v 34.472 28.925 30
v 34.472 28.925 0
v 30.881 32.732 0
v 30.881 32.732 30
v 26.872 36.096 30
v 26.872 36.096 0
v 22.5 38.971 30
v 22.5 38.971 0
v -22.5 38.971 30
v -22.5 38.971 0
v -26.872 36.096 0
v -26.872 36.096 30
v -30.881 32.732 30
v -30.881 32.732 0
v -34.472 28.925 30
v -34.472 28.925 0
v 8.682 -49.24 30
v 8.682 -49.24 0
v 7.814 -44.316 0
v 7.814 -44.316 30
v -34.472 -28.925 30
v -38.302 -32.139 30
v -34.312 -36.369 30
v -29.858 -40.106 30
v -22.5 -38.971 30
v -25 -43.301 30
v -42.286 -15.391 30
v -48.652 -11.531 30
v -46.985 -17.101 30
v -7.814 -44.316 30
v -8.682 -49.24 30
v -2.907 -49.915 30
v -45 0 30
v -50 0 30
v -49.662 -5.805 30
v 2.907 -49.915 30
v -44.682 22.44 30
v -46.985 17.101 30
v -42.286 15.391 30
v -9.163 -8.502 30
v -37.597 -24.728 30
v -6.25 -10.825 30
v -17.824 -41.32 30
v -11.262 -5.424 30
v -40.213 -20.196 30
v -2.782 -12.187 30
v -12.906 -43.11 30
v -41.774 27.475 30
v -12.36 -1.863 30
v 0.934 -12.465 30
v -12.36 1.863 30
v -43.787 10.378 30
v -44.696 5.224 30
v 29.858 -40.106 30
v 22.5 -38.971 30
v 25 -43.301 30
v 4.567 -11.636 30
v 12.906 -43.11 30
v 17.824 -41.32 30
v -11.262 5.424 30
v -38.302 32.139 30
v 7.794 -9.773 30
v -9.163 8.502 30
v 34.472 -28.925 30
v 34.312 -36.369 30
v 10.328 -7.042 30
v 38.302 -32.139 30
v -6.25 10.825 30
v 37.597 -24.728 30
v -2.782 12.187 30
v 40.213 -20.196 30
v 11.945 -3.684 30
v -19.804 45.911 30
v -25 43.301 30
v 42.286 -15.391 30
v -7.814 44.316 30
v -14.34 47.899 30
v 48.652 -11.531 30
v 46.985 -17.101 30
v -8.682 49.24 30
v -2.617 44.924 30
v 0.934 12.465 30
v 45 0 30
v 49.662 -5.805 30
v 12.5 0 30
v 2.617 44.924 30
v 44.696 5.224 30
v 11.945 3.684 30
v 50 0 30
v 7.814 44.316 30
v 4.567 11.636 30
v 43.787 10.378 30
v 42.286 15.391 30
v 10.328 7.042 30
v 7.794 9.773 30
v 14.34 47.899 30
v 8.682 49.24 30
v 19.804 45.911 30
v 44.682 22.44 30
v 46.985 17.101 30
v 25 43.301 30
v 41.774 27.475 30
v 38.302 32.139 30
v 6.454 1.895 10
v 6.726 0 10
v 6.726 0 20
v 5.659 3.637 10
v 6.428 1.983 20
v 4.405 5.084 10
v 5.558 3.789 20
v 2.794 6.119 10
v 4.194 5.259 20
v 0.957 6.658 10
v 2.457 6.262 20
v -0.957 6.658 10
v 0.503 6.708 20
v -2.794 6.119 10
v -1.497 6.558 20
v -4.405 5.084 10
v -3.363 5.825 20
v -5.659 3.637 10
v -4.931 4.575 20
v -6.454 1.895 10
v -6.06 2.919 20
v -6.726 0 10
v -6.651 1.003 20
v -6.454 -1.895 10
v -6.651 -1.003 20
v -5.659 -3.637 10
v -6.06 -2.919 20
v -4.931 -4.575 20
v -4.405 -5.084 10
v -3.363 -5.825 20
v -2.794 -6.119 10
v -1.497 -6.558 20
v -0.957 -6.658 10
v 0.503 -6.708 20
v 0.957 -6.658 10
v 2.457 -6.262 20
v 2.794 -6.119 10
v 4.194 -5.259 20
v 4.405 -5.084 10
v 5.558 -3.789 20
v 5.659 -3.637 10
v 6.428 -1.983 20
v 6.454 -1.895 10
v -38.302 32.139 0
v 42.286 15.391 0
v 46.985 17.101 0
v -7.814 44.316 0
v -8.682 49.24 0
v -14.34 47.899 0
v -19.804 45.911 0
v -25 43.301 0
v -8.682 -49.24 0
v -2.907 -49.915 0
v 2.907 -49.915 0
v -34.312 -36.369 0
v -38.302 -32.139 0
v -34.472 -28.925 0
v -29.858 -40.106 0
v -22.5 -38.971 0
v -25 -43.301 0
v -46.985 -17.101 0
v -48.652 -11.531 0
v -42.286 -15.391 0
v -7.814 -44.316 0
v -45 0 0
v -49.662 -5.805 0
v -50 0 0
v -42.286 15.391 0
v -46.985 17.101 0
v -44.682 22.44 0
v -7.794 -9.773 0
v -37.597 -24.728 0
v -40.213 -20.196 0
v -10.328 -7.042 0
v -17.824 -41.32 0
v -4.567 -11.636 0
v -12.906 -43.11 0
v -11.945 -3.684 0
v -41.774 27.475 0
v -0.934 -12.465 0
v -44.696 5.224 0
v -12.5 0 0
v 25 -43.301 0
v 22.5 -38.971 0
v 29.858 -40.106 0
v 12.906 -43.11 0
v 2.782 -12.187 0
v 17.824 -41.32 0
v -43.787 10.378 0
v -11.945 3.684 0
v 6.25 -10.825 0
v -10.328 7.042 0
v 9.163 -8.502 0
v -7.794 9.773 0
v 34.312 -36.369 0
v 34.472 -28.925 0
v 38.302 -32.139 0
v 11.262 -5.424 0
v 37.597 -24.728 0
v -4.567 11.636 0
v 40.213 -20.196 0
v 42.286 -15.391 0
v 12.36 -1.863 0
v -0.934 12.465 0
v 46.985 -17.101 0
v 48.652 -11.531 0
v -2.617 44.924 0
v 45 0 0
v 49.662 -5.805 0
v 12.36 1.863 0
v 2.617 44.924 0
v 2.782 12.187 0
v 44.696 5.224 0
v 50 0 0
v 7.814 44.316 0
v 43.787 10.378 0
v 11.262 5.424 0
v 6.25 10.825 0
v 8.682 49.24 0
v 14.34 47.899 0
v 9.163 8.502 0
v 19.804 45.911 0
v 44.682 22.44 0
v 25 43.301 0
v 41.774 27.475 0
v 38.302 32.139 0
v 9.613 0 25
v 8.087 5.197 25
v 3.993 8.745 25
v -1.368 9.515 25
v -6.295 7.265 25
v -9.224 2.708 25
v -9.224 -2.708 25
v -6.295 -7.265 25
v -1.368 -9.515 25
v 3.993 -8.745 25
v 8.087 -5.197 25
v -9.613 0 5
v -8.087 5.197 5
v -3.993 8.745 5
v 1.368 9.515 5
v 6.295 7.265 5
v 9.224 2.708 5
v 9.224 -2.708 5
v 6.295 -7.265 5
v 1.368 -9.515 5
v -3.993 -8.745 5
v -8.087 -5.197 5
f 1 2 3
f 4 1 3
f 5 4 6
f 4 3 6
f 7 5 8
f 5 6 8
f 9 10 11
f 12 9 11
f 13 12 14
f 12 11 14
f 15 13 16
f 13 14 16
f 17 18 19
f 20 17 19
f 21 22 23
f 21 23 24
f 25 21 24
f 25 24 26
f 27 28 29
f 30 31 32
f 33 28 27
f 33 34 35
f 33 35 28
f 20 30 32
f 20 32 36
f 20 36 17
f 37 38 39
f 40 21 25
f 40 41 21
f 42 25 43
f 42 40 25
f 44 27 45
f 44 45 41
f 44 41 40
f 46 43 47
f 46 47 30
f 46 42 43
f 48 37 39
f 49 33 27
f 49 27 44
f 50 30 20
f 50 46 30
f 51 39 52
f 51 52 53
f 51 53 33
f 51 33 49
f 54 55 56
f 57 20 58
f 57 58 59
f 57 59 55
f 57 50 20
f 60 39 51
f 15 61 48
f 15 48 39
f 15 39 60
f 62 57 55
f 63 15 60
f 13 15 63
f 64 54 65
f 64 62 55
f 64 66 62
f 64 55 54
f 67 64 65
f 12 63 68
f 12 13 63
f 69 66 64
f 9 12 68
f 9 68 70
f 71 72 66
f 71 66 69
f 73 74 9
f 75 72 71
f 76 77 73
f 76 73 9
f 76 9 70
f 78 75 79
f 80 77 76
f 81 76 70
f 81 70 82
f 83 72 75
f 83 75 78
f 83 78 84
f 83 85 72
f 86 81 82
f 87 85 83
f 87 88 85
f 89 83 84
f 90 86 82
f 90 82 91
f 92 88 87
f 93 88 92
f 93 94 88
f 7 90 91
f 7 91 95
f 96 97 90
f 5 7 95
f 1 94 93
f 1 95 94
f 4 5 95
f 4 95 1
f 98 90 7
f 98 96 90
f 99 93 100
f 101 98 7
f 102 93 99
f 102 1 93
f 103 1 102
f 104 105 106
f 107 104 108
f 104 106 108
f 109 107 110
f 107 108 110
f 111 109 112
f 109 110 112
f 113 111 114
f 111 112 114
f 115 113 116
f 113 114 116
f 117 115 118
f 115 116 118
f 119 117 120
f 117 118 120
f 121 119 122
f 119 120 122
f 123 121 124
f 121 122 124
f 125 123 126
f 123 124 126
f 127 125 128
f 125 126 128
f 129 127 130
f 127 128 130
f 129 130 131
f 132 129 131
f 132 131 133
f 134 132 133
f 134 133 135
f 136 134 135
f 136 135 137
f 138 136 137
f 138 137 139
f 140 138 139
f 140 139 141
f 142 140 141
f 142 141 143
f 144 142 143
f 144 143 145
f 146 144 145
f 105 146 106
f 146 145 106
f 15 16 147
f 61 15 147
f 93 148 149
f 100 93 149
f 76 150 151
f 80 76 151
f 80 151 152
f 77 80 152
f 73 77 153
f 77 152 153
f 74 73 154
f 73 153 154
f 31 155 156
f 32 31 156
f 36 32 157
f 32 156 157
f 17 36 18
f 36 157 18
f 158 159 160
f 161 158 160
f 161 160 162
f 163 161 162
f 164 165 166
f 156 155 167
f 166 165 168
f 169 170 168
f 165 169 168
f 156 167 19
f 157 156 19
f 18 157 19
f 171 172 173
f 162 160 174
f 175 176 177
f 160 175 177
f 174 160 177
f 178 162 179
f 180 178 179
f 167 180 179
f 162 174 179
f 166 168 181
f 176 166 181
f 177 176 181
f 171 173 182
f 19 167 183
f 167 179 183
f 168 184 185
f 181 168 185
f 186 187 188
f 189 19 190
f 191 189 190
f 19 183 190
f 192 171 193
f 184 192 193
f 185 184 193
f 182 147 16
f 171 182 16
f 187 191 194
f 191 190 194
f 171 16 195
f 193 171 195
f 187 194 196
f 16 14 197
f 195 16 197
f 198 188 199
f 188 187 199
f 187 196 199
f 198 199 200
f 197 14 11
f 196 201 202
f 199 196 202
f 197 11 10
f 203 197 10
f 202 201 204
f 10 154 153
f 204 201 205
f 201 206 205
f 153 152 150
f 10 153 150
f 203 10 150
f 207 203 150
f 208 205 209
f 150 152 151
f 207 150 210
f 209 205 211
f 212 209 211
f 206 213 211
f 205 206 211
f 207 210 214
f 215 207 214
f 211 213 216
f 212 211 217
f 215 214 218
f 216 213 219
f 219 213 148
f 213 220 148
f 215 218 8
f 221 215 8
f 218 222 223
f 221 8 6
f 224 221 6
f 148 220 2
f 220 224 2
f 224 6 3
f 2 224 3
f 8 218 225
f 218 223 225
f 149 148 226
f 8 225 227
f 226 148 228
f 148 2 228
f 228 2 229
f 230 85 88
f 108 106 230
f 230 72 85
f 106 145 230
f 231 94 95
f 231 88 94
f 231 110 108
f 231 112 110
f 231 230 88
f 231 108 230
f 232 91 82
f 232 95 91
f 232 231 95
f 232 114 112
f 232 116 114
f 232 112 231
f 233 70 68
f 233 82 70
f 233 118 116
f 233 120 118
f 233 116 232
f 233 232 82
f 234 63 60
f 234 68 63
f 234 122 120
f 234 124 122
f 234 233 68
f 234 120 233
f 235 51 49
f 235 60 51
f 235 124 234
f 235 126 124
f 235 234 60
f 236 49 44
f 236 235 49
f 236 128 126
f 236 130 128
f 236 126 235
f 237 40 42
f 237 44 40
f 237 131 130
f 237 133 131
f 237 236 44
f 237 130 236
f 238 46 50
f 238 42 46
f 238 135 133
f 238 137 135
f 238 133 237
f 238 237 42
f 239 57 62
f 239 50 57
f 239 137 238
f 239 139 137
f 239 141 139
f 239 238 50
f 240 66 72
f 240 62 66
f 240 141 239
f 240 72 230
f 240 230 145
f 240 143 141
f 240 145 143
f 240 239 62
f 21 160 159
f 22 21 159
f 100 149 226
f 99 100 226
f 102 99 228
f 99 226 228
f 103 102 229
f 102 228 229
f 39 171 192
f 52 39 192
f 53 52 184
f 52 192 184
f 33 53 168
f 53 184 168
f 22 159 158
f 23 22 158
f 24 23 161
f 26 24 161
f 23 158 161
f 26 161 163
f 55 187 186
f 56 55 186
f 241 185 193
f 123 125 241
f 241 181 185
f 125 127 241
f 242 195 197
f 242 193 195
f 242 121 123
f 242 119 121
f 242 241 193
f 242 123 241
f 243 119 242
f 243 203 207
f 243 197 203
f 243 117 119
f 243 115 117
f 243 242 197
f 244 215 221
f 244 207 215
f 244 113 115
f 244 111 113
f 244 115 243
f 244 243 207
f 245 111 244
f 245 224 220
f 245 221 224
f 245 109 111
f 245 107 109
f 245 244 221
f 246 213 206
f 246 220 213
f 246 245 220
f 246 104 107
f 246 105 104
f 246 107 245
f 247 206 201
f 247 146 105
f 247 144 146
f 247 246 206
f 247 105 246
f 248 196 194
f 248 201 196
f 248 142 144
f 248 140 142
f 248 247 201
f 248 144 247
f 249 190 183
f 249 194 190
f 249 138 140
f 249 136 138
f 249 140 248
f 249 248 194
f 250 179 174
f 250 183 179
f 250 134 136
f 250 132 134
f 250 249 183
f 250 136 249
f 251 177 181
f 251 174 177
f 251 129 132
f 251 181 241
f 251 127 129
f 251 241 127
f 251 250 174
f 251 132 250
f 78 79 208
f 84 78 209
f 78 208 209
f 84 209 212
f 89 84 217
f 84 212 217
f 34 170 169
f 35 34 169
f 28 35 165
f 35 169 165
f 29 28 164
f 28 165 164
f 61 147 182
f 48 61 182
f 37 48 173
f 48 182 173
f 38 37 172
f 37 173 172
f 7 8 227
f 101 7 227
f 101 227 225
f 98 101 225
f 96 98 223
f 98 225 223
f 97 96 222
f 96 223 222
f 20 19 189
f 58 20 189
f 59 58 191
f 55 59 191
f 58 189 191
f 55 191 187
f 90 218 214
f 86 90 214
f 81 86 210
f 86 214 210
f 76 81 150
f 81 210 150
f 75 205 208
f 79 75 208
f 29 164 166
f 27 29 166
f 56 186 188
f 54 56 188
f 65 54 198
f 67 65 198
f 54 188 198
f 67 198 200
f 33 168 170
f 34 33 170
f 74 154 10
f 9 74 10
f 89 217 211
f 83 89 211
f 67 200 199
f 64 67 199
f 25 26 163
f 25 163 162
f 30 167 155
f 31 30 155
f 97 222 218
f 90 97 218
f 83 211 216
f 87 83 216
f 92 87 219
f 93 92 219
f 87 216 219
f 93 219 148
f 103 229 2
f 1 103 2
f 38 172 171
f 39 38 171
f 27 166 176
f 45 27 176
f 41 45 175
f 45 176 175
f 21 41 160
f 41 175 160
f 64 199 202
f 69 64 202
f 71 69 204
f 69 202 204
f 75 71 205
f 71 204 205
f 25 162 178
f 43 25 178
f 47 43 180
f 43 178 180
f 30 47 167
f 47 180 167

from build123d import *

# Parameters (mm, degrees)
BOSS_EXTRUDE1_DEPTH = 30
SKETCH_2_R          = 12.5
CUT_EXTRUDE1_DEPTH  = 10
CUT_EXTRUDE1_TAPER  = 30
SKETCH3_OUTSIDE_W   = 142.356
SKETCH3_OUTSIDE_H   = 141.596
SKETCH3_OUTSIDE_R   = 12.5
CUT_EXTRUDE4_DEPTH  = 10
CUT_EXTRUDE4_TAPER  = 30
SKETCH8_R           = 6.726497308
CUT_EXTRUDE5_DEPTH  = 60


with BuildPart() as part:
    # Sketch1 → Boss-Extrude1 (new body)
    with BuildSketch(Plane.XY):
        with BuildLine():
            Line((-7.814167995, 44.316348886), (-8.682408883, 49.240387651))
            ThreePointArc((-8.682408883, 49.240387651), (-17.101007166, 46.984631039), (-25, 43.301270189))
            Line((-25, 43.301270189), (-22.5, 38.97114317))
            ThreePointArc((-22.5, 38.97114317), (-28.925442436, 34.47199994), (-34.47199994, 28.925442436))
            Line((-34.47199994, 28.925442436), (-38.302222156, 32.139380484))
            ThreePointArc((-38.302222156, 32.139380484), (-43.301270189, 25), (-46.984631039, 17.101007166))
            Line((-46.984631039, 17.101007166), (-42.286167935, 15.39090645))
            ThreePointArc((-42.286167935, 15.39090645), (-44.316348886, 7.814167995), (-45, 0))
            Line((-45, 0), (-50, 0))
            ThreePointArc((-50, 0), (-49.240387651, -8.682408883), (-46.984631039, -17.101007166))
            Line((-46.984631039, -17.101007166), (-42.286167935, -15.39090645))
            ThreePointArc((-42.286167935, -15.39090645), (-38.97114317, -22.5), (-34.47199994, -28.925442436))
            Line((-34.47199994, -28.925442436), (-38.302222156, -32.139380484))
            ThreePointArc((-38.302222156, -32.139380484), (-32.139380484, -38.302222156), (-25, -43.301270189))
            Line((-25, -43.301270189), (-22.5, -38.97114317))
            ThreePointArc((-22.5, -38.97114317), (-15.39090645, -42.286167935), (-7.814167995, -44.316348886))
            Line((-7.814167995, -44.316348886), (-8.682408883, -49.240387651))
            ThreePointArc((-8.682408883, -49.240387651), (0, -50), (8.682408883, -49.240387651))
            Line((8.682408883, -49.240387651), (7.814167995, -44.316348886))
            ThreePointArc((7.814167995, -44.316348886), (15.39090645, -42.286167935), (22.5, -38.97114317))
            Line((22.5, -38.97114317), (25, -43.301270189))
            ThreePointArc((25, -43.301270189), (32.139380484, -38.302222156), (38.302222156, -32.139380484))
            Line((38.302222156, -32.139380484), (34.47199994, -28.925442436))
            ThreePointArc((34.47199994, -28.925442436), (38.97114317, -22.5), (42.286167935, -15.39090645))
            Line((42.286167935, -15.39090645), (46.984631039, -17.101007166))
            ThreePointArc((46.984631039, -17.101007166), (49.240387651, -8.682408883), (50, 0))
            Line((50, 0), (45, 0))
            ThreePointArc((45, 0), (44.316348886, 7.814167995), (42.286167935, 15.39090645))
            Line((42.286167935, 15.39090645), (46.984631039, 17.101007166))
            ThreePointArc((46.984631039, 17.101007166), (43.301270189, 25), (38.302222156, 32.139380484))
            Line((38.302222156, 32.139380484), (34.47199994, 28.925442436))
            ThreePointArc((34.47199994, 28.925442436), (28.925442436, 34.47199994), (22.5, 38.97114317))
            Line((22.5, 38.97114317), (25, 43.301270189))
            ThreePointArc((25, 43.301270189), (17.101007166, 46.984631039), (8.682408883, 49.240387651))
            Line((8.682408883, 49.240387651), (7.814167995, 44.316348886))
            ThreePointArc((7.814167995, 44.316348886), (0, 45), (-7.814167995, 44.316348886))
        make_face()
    extrude(amount=BOSS_EXTRUDE1_DEPTH)

    # Sketch 2 → Cut-Extrude1 (cut)
    with BuildSketch(Plane.XY.offset(30)):
        Circle(SKETCH_2_R)
    extrude(amount=-CUT_EXTRUDE1_DEPTH, taper=CUT_EXTRUDE1_TAPER, mode=Mode.SUBTRACT)

    # Sketch3 outside → Cut-Extrude4 (cut)
    with BuildSketch(Plane(origin=(0, 0, 0), x_dir=(-1, 0, 0), z_dir=(0, 0, -1))):
        with Locations((0, -0.38)):
            Rectangle(SKETCH3_OUTSIDE_W, SKETCH3_OUTSIDE_H)
        with BuildLine():
            Line((-7.814167995, 44.316348886), (-8.682408883, 49.240387651))
            ThreePointArc((-8.682408883, 49.240387651), (-17.101007166, 46.984631039), (-25, 43.301270189))
            Line((-25, 43.301270189), (-22.5, 38.97114317))
            ThreePointArc((-22.5, 38.97114317), (-28.925442436, 34.47199994), (-34.47199994, 28.925442436))
            Line((-34.47199994, 28.925442436), (-38.302222156, 32.139380484))
            ThreePointArc((-38.302222156, 32.139380484), (-43.301270189, 25), (-46.984631039, 17.101007166))
            Line((-46.984631039, 17.101007166), (-42.286167935, 15.39090645))
            ThreePointArc((-42.286167935, 15.39090645), (-44.316348886, 7.814167995), (-45, 0))
            Line((-45, 0), (-50, 0))
            ThreePointArc((-50, 0), (-49.240387651, -8.682408883), (-46.984631039, -17.101007166))
            Line((-46.984631039, -17.101007166), (-42.286167935, -15.39090645))
            ThreePointArc((-42.286167935, -15.39090645), (-38.97114317, -22.5), (-34.47199994, -28.925442436))
            Line((-34.47199994, -28.925442436), (-38.302222156, -32.139380484))
            ThreePointArc((-38.302222156, -32.139380484), (-32.139380484, -38.302222156), (-25, -43.301270189))
            Line((-25, -43.301270189), (-22.5, -38.97114317))
            ThreePointArc((-22.5, -38.97114317), (-15.39090645, -42.286167935), (-7.814167995, -44.316348886))
            Line((-7.814167995, -44.316348886), (-8.682408883, -49.240387651))
            ThreePointArc((-8.682408883, -49.240387651), (0, -50), (8.682408883, -49.240387651))
            Line((8.682408883, -49.240387651), (7.814167995, -44.316348886))
            ThreePointArc((7.814167995, -44.316348886), (15.39090645, -42.286167935), (22.5, -38.97114317))
            Line((22.5, -38.97114317), (25, -43.301270189))
            ThreePointArc((25, -43.301270189), (32.139380484, -38.302222156), (38.302222156, -32.139380484))
            Line((38.302222156, -32.139380484), (34.47199994, -28.925442436))
            ThreePointArc((34.47199994, -28.925442436), (38.97114317, -22.5), (42.286167935, -15.39090645))
            Line((42.286167935, -15.39090645), (46.984631039, -17.101007166))
            ThreePointArc((46.984631039, -17.101007166), (49.240387651, -8.682408883), (50, 0))
            Line((50, 0), (45, 0))
            ThreePointArc((45, 0), (44.316348886, 7.814167995), (42.286167935, 15.39090645))
            Line((42.286167935, 15.39090645), (46.984631039, 17.101007166))
            ThreePointArc((46.984631039, 17.101007166), (43.301270189, 25), (38.302222156, 32.139380484))
            Line((38.302222156, 32.139380484), (34.47199994, 28.925442436))
            ThreePointArc((34.47199994, 28.925442436), (28.925442436, 34.47199994), (22.5, 38.97114317))
            Line((22.5, 38.97114317), (25, 43.301270189))
            ThreePointArc((25, 43.301270189), (17.101007166, 46.984631039), (8.682408883, 49.240387651))
            Line((8.682408883, 49.240387651), (7.814167995, 44.316348886))
            ThreePointArc((7.814167995, 44.316348886), (0, 45), (-7.814167995, 44.316348886))
        make_face(mode=Mode.SUBTRACT)
        Circle(SKETCH3_OUTSIDE_R)
    extrude(amount=-CUT_EXTRUDE4_DEPTH, taper=CUT_EXTRUDE4_TAPER, mode=Mode.SUBTRACT)

    # Sketch8 → Cut-Extrude5 (cut)
    with BuildSketch(Plane.XY.offset(20)):
        Circle(SKETCH8_R)
    extrude(amount=-CUT_EXTRUDE5_DEPTH, mode=Mode.SUBTRACT)


solid = part.part
